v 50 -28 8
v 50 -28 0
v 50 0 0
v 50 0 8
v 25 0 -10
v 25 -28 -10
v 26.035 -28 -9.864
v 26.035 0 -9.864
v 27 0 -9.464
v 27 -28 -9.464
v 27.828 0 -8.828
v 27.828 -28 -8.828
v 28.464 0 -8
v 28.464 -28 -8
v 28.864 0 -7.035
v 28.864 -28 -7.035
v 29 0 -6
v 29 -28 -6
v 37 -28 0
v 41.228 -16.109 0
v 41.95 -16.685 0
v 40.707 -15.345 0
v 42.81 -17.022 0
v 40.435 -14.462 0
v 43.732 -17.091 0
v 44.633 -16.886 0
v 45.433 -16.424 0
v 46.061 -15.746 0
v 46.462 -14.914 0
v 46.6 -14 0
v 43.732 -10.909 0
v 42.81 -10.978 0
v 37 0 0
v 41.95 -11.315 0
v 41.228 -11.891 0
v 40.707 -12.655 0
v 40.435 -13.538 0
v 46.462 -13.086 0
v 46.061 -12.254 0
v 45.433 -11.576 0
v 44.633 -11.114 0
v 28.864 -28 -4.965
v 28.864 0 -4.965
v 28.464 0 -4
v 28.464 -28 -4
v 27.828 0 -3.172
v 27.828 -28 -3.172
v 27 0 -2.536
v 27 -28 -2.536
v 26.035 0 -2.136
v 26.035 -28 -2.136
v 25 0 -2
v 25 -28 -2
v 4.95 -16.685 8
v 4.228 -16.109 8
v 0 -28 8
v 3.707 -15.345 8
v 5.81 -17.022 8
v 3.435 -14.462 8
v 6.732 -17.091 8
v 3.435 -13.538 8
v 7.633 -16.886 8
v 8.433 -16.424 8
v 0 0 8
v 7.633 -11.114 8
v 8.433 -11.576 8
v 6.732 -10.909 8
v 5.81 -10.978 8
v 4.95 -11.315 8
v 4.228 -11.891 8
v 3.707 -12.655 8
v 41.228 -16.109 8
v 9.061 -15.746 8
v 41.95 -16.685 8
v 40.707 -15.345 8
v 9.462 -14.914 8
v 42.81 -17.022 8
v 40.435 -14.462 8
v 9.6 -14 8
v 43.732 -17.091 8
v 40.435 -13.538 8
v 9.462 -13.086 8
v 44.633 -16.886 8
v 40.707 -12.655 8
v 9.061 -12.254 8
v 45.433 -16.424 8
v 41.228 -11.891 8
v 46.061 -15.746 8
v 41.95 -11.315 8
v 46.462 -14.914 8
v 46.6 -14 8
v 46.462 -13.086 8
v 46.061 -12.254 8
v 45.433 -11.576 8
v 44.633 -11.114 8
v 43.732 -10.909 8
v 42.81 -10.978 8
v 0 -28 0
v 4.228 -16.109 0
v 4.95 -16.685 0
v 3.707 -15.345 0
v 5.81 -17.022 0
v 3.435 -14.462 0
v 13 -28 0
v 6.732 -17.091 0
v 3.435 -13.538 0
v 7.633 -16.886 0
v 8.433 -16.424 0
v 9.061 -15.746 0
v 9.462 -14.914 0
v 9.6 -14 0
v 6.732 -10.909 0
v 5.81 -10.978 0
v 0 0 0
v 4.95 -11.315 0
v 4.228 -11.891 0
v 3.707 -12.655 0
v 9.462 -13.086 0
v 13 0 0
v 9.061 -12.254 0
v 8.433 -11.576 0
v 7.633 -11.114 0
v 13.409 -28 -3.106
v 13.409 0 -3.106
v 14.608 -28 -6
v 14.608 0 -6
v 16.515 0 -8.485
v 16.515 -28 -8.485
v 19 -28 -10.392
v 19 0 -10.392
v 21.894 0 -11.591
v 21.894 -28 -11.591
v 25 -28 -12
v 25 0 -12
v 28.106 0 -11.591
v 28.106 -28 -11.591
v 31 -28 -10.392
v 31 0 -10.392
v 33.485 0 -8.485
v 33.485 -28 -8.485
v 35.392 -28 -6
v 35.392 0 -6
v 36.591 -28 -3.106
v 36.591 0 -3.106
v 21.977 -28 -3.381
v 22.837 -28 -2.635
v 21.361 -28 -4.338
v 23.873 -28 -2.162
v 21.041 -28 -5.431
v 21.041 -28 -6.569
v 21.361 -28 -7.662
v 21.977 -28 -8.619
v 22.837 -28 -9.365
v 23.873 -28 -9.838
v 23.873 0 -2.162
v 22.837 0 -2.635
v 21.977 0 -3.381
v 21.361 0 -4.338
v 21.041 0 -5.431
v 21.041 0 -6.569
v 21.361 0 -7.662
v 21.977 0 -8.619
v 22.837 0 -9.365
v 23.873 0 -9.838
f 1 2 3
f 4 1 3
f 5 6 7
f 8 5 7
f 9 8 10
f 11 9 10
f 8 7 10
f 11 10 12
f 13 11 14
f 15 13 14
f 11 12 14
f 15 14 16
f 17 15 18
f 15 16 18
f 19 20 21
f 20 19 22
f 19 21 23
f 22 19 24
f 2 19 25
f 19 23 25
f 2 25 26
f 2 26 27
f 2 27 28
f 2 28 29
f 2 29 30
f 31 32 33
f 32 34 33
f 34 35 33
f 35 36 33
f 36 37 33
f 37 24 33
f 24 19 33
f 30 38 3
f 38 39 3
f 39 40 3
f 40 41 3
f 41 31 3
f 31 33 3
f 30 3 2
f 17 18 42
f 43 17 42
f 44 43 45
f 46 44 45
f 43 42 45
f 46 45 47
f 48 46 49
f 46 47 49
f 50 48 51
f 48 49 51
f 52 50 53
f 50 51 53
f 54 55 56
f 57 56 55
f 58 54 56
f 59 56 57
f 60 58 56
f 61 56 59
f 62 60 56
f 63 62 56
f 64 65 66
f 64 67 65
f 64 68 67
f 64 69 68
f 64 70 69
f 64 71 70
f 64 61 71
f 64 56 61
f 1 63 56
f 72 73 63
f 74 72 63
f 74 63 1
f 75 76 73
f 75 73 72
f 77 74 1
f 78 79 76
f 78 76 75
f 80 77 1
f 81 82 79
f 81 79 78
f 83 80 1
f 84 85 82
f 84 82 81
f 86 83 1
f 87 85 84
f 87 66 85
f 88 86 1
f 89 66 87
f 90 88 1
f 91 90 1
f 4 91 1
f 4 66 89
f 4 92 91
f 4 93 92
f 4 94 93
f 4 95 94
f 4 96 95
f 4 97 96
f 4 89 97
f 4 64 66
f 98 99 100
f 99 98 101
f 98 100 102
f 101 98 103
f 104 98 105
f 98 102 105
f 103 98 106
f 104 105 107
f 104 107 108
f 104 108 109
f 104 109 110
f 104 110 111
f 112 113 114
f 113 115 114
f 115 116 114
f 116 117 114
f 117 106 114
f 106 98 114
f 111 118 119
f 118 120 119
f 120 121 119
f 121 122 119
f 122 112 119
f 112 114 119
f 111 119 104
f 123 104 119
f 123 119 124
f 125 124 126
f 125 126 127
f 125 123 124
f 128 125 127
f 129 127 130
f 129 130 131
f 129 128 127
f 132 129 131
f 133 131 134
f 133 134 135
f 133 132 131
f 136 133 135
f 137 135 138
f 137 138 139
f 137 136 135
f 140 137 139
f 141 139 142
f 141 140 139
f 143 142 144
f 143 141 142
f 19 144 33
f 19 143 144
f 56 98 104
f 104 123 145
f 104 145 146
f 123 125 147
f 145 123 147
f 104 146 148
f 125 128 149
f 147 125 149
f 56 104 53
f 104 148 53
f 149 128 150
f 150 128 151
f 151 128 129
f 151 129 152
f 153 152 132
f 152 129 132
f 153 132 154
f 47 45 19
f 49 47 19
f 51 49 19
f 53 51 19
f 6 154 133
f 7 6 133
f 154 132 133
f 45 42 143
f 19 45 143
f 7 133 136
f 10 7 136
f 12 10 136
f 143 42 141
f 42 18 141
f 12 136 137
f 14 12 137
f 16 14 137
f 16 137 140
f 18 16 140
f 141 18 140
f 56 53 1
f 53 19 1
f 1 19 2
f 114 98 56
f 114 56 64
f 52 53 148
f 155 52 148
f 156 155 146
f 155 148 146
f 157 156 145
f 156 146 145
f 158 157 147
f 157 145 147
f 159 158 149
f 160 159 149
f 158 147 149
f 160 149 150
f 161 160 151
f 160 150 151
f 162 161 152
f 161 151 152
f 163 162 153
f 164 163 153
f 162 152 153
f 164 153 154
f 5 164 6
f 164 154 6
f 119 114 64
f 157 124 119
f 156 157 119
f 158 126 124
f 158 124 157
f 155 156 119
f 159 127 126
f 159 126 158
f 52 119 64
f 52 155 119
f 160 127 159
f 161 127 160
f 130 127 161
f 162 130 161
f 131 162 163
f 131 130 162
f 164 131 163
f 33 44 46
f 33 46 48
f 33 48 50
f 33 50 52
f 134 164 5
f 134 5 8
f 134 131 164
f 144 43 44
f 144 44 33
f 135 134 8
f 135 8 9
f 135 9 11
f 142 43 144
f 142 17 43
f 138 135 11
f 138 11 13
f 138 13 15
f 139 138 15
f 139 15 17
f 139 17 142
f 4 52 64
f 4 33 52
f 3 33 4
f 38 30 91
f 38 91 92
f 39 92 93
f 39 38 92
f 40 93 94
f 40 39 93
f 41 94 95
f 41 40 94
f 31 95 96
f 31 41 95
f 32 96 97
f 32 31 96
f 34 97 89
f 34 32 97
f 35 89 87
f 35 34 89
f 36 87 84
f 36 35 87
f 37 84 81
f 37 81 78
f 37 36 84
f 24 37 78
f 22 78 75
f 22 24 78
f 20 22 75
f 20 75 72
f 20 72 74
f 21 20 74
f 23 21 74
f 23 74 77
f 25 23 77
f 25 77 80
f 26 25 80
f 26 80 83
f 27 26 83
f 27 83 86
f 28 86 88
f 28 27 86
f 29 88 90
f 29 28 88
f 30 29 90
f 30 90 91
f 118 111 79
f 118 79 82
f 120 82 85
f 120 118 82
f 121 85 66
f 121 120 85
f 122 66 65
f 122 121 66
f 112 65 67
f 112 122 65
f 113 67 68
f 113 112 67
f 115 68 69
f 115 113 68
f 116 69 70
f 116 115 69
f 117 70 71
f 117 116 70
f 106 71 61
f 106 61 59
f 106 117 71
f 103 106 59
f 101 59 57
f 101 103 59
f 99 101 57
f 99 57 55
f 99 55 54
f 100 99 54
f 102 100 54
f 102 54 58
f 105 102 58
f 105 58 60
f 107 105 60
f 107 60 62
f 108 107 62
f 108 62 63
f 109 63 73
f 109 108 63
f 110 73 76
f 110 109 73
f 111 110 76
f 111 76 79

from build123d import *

# Parameters (mm, degrees)
SKETCH_1_W          = 50
SKETCH_1_H          = 28
EXTRUDE_1_DEPTH     = 8
EXTRUDE_2_DEPTH     = 28
CUT_EXTRUDE_1_DEPTH = 28
SKETCH_1_4_R        = 3.1
CUT_EXTRUDE_2_DEPTH = 8


with BuildPart() as part:
    # 草图1 → 凸台-拉伸1 (new body)
    with BuildSketch(Plane.XY):
        with Locations((25, -14)):
            Rectangle(SKETCH_1_W, SKETCH_1_H)
    extrude(amount=EXTRUDE_1_DEPTH)

    # 草图2 → 凸台-拉伸2 (add)
    with BuildSketch(Plane.XZ.offset(28)):
        with BuildLine():
            Line((37, 0), (25, 0))
            Line((25, 0), (13, 0))
            ThreePointArc((13, 0), (25, -12), (37, 0))
        make_face()
    extrude(amount=-EXTRUDE_2_DEPTH)

    # 草图3 → 切除-拉伸1 (cut)
    with BuildSketch(Plane.XZ.offset(28)):
        with BuildLine():
            ThreePointArc((25, -2), (21, -6), (25, -10))
            Line((25, -10), (25, -2))
        make_face()
        with BuildLine():
            Line((25, -2), (25, -10))
            ThreePointArc((25, -10), (27.828427125, -8.828427125), (29, -6))
            ThreePointArc((29, -6), (27.828427125, -3.171572875), (25, -2))
        make_face()
    extrude(amount=-CUT_EXTRUDE_1_DEPTH, mode=Mode.SUBTRACT)

    # 草图1<4> → 切除-拉伸2 (cut)
    with BuildSketch(Plane.XY):
        with Locations((6.5, -14)):
            Circle(SKETCH_1_4_R)
        with Locations((43.5, -14)):
            Circle(SKETCH_1_4_R)
    extrude(amount=CUT_EXTRUDE_2_DEPTH, mode=Mode.SUBTRACT)


solid = part.part
